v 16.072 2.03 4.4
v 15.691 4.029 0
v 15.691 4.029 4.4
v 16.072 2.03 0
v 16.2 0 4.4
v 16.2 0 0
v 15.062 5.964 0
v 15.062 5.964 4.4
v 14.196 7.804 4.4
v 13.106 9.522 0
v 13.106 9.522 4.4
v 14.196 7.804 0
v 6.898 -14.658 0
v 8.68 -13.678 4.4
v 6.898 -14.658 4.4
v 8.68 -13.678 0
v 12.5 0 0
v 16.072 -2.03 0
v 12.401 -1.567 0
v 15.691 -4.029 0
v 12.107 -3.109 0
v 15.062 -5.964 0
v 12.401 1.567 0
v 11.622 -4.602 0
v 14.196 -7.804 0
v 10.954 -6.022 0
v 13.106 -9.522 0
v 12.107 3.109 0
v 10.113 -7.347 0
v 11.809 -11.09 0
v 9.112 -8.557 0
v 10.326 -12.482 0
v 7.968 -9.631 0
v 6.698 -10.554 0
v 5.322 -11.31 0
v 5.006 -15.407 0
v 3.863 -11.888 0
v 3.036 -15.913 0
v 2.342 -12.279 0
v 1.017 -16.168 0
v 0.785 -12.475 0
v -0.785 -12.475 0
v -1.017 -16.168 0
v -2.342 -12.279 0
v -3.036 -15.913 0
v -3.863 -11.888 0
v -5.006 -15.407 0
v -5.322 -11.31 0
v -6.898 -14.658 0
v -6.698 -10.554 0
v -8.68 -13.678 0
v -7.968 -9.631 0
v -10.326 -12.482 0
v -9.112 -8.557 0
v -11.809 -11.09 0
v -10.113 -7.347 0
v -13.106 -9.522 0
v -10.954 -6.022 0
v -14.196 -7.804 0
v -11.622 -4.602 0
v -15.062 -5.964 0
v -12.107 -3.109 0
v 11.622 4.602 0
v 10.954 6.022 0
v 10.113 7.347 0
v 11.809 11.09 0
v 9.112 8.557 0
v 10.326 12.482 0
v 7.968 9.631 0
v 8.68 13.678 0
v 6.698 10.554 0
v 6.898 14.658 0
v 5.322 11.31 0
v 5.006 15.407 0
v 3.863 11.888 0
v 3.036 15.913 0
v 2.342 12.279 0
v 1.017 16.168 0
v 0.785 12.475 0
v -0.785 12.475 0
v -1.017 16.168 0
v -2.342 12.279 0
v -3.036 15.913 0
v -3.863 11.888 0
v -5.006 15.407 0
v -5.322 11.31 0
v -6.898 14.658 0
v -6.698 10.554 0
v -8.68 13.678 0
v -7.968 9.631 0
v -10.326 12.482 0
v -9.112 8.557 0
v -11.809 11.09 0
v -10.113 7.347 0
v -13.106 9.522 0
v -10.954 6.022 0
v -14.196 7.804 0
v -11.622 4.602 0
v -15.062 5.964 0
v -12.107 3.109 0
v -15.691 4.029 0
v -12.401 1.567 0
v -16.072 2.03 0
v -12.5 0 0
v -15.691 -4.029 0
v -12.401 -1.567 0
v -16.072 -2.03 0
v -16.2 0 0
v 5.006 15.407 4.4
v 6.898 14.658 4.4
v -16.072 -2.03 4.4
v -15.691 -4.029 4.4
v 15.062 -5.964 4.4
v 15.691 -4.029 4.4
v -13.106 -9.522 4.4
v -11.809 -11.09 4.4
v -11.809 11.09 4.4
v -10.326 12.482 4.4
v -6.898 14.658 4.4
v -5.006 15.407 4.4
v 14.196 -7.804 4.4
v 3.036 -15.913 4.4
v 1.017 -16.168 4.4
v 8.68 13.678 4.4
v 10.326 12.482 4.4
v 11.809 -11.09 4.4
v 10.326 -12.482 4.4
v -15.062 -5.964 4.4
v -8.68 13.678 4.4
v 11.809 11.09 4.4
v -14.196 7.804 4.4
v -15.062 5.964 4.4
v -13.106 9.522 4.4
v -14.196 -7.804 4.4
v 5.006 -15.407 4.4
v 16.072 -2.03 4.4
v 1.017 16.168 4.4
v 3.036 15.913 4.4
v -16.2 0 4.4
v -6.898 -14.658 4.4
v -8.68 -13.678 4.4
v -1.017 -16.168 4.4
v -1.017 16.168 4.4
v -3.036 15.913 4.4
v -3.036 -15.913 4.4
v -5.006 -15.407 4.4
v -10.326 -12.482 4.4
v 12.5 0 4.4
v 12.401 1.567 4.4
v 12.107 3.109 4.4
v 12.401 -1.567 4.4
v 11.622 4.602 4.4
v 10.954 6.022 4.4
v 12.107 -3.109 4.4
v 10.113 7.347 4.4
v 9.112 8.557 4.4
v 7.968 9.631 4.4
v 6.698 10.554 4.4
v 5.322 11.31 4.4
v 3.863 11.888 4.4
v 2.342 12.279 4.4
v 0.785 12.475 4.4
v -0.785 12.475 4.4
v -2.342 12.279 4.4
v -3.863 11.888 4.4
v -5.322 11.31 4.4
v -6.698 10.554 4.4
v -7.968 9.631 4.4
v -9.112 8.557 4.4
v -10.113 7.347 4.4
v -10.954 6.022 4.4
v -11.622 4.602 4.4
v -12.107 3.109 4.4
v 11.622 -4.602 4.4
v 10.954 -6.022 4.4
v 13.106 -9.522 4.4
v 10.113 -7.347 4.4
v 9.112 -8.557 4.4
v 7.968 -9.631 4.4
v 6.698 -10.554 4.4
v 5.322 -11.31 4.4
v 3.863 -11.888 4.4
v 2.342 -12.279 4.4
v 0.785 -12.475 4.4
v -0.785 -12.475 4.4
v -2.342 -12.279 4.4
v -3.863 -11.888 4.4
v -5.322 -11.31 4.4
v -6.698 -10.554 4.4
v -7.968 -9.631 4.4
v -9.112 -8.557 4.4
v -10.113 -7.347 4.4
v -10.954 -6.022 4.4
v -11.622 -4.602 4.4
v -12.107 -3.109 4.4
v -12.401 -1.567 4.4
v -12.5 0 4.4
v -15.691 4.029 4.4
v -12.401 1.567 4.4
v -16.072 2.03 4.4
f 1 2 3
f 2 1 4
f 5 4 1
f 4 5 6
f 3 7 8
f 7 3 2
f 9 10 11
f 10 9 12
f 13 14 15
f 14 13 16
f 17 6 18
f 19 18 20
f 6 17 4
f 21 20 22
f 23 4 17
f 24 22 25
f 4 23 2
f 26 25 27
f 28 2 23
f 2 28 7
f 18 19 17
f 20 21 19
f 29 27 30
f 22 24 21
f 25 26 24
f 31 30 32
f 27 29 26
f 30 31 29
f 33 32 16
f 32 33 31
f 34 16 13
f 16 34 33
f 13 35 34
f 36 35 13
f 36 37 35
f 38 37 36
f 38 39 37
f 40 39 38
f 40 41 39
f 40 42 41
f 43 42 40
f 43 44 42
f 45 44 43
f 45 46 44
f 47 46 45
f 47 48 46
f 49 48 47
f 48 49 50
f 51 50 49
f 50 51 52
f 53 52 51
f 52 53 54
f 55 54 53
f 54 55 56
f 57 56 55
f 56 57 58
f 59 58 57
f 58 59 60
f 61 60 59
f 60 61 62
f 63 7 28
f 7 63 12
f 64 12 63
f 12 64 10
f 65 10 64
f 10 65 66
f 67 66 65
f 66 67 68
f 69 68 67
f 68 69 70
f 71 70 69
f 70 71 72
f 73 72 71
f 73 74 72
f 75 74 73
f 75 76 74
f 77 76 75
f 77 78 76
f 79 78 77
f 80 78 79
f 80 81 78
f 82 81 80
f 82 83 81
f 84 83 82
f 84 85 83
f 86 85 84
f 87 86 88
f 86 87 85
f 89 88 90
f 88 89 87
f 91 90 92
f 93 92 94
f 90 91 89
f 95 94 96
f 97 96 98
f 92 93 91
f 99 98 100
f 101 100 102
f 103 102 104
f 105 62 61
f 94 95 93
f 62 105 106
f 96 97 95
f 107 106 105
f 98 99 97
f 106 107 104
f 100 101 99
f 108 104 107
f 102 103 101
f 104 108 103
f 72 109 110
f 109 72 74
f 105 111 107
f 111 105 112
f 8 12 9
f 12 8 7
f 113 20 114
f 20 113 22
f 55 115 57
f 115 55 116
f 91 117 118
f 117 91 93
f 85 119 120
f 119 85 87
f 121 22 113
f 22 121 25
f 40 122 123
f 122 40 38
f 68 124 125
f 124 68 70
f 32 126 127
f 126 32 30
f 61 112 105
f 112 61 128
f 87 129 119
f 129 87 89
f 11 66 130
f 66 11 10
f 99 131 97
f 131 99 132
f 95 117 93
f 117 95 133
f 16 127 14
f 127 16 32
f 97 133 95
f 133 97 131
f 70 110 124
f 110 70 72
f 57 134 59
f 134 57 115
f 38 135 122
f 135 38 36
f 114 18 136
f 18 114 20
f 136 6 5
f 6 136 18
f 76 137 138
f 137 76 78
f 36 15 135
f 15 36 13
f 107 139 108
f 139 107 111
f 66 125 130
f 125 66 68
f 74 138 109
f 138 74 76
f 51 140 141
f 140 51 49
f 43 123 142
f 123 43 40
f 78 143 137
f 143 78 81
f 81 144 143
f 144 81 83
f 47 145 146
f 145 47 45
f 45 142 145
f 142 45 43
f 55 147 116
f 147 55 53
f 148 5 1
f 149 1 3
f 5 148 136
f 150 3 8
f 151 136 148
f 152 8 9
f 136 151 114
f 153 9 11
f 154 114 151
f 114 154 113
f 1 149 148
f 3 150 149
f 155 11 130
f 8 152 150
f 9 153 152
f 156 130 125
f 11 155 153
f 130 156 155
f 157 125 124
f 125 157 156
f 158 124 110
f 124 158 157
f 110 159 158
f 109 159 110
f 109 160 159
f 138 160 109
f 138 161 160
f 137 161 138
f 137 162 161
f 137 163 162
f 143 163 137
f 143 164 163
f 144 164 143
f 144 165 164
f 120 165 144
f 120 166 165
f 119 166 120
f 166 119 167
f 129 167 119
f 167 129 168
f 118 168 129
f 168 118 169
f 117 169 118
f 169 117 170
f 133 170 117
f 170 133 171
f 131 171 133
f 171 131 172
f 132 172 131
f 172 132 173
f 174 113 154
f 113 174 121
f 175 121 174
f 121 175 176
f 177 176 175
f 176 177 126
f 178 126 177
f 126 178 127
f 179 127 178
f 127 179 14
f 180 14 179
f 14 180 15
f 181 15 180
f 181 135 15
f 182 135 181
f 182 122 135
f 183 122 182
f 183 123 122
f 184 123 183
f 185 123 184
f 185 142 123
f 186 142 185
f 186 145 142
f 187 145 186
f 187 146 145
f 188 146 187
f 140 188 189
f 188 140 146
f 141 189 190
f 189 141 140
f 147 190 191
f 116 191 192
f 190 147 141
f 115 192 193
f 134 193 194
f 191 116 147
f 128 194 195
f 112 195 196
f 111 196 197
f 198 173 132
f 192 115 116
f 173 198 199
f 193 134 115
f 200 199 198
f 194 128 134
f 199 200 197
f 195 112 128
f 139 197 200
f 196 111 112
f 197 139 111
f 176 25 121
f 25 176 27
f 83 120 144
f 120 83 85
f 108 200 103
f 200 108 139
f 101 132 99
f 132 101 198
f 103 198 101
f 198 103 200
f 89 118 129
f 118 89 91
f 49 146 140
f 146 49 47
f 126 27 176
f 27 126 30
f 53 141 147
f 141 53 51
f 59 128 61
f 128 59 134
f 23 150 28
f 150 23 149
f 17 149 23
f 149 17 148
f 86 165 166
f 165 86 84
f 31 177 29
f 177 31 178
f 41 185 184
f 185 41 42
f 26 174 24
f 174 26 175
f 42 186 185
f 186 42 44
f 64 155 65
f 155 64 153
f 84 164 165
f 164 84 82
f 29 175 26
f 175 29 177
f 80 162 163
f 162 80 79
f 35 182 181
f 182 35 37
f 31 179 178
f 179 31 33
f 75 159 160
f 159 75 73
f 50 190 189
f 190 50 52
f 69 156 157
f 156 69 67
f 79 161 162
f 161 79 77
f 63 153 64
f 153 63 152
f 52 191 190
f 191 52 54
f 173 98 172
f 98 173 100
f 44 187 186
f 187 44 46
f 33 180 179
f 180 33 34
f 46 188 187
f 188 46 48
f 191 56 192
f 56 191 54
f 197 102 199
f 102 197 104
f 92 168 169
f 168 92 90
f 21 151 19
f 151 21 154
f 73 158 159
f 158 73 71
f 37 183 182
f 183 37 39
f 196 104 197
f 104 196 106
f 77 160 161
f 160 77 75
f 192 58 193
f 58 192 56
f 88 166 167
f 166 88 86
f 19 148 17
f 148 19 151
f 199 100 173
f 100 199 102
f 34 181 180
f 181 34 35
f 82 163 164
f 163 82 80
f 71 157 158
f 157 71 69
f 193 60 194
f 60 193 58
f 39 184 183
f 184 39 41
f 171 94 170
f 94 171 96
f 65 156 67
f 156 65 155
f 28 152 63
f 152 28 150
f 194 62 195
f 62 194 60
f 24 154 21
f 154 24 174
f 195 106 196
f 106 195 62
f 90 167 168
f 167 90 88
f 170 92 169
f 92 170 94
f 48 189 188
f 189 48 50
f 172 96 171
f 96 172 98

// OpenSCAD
$fn = 50;


difference() {
	union() {
		cylinder(h = 4.4000000000, r = 16.2000000000);
	}
	union() {
		cylinder(h = 4.4000000000, r = 12.5000000000);
	}
}
